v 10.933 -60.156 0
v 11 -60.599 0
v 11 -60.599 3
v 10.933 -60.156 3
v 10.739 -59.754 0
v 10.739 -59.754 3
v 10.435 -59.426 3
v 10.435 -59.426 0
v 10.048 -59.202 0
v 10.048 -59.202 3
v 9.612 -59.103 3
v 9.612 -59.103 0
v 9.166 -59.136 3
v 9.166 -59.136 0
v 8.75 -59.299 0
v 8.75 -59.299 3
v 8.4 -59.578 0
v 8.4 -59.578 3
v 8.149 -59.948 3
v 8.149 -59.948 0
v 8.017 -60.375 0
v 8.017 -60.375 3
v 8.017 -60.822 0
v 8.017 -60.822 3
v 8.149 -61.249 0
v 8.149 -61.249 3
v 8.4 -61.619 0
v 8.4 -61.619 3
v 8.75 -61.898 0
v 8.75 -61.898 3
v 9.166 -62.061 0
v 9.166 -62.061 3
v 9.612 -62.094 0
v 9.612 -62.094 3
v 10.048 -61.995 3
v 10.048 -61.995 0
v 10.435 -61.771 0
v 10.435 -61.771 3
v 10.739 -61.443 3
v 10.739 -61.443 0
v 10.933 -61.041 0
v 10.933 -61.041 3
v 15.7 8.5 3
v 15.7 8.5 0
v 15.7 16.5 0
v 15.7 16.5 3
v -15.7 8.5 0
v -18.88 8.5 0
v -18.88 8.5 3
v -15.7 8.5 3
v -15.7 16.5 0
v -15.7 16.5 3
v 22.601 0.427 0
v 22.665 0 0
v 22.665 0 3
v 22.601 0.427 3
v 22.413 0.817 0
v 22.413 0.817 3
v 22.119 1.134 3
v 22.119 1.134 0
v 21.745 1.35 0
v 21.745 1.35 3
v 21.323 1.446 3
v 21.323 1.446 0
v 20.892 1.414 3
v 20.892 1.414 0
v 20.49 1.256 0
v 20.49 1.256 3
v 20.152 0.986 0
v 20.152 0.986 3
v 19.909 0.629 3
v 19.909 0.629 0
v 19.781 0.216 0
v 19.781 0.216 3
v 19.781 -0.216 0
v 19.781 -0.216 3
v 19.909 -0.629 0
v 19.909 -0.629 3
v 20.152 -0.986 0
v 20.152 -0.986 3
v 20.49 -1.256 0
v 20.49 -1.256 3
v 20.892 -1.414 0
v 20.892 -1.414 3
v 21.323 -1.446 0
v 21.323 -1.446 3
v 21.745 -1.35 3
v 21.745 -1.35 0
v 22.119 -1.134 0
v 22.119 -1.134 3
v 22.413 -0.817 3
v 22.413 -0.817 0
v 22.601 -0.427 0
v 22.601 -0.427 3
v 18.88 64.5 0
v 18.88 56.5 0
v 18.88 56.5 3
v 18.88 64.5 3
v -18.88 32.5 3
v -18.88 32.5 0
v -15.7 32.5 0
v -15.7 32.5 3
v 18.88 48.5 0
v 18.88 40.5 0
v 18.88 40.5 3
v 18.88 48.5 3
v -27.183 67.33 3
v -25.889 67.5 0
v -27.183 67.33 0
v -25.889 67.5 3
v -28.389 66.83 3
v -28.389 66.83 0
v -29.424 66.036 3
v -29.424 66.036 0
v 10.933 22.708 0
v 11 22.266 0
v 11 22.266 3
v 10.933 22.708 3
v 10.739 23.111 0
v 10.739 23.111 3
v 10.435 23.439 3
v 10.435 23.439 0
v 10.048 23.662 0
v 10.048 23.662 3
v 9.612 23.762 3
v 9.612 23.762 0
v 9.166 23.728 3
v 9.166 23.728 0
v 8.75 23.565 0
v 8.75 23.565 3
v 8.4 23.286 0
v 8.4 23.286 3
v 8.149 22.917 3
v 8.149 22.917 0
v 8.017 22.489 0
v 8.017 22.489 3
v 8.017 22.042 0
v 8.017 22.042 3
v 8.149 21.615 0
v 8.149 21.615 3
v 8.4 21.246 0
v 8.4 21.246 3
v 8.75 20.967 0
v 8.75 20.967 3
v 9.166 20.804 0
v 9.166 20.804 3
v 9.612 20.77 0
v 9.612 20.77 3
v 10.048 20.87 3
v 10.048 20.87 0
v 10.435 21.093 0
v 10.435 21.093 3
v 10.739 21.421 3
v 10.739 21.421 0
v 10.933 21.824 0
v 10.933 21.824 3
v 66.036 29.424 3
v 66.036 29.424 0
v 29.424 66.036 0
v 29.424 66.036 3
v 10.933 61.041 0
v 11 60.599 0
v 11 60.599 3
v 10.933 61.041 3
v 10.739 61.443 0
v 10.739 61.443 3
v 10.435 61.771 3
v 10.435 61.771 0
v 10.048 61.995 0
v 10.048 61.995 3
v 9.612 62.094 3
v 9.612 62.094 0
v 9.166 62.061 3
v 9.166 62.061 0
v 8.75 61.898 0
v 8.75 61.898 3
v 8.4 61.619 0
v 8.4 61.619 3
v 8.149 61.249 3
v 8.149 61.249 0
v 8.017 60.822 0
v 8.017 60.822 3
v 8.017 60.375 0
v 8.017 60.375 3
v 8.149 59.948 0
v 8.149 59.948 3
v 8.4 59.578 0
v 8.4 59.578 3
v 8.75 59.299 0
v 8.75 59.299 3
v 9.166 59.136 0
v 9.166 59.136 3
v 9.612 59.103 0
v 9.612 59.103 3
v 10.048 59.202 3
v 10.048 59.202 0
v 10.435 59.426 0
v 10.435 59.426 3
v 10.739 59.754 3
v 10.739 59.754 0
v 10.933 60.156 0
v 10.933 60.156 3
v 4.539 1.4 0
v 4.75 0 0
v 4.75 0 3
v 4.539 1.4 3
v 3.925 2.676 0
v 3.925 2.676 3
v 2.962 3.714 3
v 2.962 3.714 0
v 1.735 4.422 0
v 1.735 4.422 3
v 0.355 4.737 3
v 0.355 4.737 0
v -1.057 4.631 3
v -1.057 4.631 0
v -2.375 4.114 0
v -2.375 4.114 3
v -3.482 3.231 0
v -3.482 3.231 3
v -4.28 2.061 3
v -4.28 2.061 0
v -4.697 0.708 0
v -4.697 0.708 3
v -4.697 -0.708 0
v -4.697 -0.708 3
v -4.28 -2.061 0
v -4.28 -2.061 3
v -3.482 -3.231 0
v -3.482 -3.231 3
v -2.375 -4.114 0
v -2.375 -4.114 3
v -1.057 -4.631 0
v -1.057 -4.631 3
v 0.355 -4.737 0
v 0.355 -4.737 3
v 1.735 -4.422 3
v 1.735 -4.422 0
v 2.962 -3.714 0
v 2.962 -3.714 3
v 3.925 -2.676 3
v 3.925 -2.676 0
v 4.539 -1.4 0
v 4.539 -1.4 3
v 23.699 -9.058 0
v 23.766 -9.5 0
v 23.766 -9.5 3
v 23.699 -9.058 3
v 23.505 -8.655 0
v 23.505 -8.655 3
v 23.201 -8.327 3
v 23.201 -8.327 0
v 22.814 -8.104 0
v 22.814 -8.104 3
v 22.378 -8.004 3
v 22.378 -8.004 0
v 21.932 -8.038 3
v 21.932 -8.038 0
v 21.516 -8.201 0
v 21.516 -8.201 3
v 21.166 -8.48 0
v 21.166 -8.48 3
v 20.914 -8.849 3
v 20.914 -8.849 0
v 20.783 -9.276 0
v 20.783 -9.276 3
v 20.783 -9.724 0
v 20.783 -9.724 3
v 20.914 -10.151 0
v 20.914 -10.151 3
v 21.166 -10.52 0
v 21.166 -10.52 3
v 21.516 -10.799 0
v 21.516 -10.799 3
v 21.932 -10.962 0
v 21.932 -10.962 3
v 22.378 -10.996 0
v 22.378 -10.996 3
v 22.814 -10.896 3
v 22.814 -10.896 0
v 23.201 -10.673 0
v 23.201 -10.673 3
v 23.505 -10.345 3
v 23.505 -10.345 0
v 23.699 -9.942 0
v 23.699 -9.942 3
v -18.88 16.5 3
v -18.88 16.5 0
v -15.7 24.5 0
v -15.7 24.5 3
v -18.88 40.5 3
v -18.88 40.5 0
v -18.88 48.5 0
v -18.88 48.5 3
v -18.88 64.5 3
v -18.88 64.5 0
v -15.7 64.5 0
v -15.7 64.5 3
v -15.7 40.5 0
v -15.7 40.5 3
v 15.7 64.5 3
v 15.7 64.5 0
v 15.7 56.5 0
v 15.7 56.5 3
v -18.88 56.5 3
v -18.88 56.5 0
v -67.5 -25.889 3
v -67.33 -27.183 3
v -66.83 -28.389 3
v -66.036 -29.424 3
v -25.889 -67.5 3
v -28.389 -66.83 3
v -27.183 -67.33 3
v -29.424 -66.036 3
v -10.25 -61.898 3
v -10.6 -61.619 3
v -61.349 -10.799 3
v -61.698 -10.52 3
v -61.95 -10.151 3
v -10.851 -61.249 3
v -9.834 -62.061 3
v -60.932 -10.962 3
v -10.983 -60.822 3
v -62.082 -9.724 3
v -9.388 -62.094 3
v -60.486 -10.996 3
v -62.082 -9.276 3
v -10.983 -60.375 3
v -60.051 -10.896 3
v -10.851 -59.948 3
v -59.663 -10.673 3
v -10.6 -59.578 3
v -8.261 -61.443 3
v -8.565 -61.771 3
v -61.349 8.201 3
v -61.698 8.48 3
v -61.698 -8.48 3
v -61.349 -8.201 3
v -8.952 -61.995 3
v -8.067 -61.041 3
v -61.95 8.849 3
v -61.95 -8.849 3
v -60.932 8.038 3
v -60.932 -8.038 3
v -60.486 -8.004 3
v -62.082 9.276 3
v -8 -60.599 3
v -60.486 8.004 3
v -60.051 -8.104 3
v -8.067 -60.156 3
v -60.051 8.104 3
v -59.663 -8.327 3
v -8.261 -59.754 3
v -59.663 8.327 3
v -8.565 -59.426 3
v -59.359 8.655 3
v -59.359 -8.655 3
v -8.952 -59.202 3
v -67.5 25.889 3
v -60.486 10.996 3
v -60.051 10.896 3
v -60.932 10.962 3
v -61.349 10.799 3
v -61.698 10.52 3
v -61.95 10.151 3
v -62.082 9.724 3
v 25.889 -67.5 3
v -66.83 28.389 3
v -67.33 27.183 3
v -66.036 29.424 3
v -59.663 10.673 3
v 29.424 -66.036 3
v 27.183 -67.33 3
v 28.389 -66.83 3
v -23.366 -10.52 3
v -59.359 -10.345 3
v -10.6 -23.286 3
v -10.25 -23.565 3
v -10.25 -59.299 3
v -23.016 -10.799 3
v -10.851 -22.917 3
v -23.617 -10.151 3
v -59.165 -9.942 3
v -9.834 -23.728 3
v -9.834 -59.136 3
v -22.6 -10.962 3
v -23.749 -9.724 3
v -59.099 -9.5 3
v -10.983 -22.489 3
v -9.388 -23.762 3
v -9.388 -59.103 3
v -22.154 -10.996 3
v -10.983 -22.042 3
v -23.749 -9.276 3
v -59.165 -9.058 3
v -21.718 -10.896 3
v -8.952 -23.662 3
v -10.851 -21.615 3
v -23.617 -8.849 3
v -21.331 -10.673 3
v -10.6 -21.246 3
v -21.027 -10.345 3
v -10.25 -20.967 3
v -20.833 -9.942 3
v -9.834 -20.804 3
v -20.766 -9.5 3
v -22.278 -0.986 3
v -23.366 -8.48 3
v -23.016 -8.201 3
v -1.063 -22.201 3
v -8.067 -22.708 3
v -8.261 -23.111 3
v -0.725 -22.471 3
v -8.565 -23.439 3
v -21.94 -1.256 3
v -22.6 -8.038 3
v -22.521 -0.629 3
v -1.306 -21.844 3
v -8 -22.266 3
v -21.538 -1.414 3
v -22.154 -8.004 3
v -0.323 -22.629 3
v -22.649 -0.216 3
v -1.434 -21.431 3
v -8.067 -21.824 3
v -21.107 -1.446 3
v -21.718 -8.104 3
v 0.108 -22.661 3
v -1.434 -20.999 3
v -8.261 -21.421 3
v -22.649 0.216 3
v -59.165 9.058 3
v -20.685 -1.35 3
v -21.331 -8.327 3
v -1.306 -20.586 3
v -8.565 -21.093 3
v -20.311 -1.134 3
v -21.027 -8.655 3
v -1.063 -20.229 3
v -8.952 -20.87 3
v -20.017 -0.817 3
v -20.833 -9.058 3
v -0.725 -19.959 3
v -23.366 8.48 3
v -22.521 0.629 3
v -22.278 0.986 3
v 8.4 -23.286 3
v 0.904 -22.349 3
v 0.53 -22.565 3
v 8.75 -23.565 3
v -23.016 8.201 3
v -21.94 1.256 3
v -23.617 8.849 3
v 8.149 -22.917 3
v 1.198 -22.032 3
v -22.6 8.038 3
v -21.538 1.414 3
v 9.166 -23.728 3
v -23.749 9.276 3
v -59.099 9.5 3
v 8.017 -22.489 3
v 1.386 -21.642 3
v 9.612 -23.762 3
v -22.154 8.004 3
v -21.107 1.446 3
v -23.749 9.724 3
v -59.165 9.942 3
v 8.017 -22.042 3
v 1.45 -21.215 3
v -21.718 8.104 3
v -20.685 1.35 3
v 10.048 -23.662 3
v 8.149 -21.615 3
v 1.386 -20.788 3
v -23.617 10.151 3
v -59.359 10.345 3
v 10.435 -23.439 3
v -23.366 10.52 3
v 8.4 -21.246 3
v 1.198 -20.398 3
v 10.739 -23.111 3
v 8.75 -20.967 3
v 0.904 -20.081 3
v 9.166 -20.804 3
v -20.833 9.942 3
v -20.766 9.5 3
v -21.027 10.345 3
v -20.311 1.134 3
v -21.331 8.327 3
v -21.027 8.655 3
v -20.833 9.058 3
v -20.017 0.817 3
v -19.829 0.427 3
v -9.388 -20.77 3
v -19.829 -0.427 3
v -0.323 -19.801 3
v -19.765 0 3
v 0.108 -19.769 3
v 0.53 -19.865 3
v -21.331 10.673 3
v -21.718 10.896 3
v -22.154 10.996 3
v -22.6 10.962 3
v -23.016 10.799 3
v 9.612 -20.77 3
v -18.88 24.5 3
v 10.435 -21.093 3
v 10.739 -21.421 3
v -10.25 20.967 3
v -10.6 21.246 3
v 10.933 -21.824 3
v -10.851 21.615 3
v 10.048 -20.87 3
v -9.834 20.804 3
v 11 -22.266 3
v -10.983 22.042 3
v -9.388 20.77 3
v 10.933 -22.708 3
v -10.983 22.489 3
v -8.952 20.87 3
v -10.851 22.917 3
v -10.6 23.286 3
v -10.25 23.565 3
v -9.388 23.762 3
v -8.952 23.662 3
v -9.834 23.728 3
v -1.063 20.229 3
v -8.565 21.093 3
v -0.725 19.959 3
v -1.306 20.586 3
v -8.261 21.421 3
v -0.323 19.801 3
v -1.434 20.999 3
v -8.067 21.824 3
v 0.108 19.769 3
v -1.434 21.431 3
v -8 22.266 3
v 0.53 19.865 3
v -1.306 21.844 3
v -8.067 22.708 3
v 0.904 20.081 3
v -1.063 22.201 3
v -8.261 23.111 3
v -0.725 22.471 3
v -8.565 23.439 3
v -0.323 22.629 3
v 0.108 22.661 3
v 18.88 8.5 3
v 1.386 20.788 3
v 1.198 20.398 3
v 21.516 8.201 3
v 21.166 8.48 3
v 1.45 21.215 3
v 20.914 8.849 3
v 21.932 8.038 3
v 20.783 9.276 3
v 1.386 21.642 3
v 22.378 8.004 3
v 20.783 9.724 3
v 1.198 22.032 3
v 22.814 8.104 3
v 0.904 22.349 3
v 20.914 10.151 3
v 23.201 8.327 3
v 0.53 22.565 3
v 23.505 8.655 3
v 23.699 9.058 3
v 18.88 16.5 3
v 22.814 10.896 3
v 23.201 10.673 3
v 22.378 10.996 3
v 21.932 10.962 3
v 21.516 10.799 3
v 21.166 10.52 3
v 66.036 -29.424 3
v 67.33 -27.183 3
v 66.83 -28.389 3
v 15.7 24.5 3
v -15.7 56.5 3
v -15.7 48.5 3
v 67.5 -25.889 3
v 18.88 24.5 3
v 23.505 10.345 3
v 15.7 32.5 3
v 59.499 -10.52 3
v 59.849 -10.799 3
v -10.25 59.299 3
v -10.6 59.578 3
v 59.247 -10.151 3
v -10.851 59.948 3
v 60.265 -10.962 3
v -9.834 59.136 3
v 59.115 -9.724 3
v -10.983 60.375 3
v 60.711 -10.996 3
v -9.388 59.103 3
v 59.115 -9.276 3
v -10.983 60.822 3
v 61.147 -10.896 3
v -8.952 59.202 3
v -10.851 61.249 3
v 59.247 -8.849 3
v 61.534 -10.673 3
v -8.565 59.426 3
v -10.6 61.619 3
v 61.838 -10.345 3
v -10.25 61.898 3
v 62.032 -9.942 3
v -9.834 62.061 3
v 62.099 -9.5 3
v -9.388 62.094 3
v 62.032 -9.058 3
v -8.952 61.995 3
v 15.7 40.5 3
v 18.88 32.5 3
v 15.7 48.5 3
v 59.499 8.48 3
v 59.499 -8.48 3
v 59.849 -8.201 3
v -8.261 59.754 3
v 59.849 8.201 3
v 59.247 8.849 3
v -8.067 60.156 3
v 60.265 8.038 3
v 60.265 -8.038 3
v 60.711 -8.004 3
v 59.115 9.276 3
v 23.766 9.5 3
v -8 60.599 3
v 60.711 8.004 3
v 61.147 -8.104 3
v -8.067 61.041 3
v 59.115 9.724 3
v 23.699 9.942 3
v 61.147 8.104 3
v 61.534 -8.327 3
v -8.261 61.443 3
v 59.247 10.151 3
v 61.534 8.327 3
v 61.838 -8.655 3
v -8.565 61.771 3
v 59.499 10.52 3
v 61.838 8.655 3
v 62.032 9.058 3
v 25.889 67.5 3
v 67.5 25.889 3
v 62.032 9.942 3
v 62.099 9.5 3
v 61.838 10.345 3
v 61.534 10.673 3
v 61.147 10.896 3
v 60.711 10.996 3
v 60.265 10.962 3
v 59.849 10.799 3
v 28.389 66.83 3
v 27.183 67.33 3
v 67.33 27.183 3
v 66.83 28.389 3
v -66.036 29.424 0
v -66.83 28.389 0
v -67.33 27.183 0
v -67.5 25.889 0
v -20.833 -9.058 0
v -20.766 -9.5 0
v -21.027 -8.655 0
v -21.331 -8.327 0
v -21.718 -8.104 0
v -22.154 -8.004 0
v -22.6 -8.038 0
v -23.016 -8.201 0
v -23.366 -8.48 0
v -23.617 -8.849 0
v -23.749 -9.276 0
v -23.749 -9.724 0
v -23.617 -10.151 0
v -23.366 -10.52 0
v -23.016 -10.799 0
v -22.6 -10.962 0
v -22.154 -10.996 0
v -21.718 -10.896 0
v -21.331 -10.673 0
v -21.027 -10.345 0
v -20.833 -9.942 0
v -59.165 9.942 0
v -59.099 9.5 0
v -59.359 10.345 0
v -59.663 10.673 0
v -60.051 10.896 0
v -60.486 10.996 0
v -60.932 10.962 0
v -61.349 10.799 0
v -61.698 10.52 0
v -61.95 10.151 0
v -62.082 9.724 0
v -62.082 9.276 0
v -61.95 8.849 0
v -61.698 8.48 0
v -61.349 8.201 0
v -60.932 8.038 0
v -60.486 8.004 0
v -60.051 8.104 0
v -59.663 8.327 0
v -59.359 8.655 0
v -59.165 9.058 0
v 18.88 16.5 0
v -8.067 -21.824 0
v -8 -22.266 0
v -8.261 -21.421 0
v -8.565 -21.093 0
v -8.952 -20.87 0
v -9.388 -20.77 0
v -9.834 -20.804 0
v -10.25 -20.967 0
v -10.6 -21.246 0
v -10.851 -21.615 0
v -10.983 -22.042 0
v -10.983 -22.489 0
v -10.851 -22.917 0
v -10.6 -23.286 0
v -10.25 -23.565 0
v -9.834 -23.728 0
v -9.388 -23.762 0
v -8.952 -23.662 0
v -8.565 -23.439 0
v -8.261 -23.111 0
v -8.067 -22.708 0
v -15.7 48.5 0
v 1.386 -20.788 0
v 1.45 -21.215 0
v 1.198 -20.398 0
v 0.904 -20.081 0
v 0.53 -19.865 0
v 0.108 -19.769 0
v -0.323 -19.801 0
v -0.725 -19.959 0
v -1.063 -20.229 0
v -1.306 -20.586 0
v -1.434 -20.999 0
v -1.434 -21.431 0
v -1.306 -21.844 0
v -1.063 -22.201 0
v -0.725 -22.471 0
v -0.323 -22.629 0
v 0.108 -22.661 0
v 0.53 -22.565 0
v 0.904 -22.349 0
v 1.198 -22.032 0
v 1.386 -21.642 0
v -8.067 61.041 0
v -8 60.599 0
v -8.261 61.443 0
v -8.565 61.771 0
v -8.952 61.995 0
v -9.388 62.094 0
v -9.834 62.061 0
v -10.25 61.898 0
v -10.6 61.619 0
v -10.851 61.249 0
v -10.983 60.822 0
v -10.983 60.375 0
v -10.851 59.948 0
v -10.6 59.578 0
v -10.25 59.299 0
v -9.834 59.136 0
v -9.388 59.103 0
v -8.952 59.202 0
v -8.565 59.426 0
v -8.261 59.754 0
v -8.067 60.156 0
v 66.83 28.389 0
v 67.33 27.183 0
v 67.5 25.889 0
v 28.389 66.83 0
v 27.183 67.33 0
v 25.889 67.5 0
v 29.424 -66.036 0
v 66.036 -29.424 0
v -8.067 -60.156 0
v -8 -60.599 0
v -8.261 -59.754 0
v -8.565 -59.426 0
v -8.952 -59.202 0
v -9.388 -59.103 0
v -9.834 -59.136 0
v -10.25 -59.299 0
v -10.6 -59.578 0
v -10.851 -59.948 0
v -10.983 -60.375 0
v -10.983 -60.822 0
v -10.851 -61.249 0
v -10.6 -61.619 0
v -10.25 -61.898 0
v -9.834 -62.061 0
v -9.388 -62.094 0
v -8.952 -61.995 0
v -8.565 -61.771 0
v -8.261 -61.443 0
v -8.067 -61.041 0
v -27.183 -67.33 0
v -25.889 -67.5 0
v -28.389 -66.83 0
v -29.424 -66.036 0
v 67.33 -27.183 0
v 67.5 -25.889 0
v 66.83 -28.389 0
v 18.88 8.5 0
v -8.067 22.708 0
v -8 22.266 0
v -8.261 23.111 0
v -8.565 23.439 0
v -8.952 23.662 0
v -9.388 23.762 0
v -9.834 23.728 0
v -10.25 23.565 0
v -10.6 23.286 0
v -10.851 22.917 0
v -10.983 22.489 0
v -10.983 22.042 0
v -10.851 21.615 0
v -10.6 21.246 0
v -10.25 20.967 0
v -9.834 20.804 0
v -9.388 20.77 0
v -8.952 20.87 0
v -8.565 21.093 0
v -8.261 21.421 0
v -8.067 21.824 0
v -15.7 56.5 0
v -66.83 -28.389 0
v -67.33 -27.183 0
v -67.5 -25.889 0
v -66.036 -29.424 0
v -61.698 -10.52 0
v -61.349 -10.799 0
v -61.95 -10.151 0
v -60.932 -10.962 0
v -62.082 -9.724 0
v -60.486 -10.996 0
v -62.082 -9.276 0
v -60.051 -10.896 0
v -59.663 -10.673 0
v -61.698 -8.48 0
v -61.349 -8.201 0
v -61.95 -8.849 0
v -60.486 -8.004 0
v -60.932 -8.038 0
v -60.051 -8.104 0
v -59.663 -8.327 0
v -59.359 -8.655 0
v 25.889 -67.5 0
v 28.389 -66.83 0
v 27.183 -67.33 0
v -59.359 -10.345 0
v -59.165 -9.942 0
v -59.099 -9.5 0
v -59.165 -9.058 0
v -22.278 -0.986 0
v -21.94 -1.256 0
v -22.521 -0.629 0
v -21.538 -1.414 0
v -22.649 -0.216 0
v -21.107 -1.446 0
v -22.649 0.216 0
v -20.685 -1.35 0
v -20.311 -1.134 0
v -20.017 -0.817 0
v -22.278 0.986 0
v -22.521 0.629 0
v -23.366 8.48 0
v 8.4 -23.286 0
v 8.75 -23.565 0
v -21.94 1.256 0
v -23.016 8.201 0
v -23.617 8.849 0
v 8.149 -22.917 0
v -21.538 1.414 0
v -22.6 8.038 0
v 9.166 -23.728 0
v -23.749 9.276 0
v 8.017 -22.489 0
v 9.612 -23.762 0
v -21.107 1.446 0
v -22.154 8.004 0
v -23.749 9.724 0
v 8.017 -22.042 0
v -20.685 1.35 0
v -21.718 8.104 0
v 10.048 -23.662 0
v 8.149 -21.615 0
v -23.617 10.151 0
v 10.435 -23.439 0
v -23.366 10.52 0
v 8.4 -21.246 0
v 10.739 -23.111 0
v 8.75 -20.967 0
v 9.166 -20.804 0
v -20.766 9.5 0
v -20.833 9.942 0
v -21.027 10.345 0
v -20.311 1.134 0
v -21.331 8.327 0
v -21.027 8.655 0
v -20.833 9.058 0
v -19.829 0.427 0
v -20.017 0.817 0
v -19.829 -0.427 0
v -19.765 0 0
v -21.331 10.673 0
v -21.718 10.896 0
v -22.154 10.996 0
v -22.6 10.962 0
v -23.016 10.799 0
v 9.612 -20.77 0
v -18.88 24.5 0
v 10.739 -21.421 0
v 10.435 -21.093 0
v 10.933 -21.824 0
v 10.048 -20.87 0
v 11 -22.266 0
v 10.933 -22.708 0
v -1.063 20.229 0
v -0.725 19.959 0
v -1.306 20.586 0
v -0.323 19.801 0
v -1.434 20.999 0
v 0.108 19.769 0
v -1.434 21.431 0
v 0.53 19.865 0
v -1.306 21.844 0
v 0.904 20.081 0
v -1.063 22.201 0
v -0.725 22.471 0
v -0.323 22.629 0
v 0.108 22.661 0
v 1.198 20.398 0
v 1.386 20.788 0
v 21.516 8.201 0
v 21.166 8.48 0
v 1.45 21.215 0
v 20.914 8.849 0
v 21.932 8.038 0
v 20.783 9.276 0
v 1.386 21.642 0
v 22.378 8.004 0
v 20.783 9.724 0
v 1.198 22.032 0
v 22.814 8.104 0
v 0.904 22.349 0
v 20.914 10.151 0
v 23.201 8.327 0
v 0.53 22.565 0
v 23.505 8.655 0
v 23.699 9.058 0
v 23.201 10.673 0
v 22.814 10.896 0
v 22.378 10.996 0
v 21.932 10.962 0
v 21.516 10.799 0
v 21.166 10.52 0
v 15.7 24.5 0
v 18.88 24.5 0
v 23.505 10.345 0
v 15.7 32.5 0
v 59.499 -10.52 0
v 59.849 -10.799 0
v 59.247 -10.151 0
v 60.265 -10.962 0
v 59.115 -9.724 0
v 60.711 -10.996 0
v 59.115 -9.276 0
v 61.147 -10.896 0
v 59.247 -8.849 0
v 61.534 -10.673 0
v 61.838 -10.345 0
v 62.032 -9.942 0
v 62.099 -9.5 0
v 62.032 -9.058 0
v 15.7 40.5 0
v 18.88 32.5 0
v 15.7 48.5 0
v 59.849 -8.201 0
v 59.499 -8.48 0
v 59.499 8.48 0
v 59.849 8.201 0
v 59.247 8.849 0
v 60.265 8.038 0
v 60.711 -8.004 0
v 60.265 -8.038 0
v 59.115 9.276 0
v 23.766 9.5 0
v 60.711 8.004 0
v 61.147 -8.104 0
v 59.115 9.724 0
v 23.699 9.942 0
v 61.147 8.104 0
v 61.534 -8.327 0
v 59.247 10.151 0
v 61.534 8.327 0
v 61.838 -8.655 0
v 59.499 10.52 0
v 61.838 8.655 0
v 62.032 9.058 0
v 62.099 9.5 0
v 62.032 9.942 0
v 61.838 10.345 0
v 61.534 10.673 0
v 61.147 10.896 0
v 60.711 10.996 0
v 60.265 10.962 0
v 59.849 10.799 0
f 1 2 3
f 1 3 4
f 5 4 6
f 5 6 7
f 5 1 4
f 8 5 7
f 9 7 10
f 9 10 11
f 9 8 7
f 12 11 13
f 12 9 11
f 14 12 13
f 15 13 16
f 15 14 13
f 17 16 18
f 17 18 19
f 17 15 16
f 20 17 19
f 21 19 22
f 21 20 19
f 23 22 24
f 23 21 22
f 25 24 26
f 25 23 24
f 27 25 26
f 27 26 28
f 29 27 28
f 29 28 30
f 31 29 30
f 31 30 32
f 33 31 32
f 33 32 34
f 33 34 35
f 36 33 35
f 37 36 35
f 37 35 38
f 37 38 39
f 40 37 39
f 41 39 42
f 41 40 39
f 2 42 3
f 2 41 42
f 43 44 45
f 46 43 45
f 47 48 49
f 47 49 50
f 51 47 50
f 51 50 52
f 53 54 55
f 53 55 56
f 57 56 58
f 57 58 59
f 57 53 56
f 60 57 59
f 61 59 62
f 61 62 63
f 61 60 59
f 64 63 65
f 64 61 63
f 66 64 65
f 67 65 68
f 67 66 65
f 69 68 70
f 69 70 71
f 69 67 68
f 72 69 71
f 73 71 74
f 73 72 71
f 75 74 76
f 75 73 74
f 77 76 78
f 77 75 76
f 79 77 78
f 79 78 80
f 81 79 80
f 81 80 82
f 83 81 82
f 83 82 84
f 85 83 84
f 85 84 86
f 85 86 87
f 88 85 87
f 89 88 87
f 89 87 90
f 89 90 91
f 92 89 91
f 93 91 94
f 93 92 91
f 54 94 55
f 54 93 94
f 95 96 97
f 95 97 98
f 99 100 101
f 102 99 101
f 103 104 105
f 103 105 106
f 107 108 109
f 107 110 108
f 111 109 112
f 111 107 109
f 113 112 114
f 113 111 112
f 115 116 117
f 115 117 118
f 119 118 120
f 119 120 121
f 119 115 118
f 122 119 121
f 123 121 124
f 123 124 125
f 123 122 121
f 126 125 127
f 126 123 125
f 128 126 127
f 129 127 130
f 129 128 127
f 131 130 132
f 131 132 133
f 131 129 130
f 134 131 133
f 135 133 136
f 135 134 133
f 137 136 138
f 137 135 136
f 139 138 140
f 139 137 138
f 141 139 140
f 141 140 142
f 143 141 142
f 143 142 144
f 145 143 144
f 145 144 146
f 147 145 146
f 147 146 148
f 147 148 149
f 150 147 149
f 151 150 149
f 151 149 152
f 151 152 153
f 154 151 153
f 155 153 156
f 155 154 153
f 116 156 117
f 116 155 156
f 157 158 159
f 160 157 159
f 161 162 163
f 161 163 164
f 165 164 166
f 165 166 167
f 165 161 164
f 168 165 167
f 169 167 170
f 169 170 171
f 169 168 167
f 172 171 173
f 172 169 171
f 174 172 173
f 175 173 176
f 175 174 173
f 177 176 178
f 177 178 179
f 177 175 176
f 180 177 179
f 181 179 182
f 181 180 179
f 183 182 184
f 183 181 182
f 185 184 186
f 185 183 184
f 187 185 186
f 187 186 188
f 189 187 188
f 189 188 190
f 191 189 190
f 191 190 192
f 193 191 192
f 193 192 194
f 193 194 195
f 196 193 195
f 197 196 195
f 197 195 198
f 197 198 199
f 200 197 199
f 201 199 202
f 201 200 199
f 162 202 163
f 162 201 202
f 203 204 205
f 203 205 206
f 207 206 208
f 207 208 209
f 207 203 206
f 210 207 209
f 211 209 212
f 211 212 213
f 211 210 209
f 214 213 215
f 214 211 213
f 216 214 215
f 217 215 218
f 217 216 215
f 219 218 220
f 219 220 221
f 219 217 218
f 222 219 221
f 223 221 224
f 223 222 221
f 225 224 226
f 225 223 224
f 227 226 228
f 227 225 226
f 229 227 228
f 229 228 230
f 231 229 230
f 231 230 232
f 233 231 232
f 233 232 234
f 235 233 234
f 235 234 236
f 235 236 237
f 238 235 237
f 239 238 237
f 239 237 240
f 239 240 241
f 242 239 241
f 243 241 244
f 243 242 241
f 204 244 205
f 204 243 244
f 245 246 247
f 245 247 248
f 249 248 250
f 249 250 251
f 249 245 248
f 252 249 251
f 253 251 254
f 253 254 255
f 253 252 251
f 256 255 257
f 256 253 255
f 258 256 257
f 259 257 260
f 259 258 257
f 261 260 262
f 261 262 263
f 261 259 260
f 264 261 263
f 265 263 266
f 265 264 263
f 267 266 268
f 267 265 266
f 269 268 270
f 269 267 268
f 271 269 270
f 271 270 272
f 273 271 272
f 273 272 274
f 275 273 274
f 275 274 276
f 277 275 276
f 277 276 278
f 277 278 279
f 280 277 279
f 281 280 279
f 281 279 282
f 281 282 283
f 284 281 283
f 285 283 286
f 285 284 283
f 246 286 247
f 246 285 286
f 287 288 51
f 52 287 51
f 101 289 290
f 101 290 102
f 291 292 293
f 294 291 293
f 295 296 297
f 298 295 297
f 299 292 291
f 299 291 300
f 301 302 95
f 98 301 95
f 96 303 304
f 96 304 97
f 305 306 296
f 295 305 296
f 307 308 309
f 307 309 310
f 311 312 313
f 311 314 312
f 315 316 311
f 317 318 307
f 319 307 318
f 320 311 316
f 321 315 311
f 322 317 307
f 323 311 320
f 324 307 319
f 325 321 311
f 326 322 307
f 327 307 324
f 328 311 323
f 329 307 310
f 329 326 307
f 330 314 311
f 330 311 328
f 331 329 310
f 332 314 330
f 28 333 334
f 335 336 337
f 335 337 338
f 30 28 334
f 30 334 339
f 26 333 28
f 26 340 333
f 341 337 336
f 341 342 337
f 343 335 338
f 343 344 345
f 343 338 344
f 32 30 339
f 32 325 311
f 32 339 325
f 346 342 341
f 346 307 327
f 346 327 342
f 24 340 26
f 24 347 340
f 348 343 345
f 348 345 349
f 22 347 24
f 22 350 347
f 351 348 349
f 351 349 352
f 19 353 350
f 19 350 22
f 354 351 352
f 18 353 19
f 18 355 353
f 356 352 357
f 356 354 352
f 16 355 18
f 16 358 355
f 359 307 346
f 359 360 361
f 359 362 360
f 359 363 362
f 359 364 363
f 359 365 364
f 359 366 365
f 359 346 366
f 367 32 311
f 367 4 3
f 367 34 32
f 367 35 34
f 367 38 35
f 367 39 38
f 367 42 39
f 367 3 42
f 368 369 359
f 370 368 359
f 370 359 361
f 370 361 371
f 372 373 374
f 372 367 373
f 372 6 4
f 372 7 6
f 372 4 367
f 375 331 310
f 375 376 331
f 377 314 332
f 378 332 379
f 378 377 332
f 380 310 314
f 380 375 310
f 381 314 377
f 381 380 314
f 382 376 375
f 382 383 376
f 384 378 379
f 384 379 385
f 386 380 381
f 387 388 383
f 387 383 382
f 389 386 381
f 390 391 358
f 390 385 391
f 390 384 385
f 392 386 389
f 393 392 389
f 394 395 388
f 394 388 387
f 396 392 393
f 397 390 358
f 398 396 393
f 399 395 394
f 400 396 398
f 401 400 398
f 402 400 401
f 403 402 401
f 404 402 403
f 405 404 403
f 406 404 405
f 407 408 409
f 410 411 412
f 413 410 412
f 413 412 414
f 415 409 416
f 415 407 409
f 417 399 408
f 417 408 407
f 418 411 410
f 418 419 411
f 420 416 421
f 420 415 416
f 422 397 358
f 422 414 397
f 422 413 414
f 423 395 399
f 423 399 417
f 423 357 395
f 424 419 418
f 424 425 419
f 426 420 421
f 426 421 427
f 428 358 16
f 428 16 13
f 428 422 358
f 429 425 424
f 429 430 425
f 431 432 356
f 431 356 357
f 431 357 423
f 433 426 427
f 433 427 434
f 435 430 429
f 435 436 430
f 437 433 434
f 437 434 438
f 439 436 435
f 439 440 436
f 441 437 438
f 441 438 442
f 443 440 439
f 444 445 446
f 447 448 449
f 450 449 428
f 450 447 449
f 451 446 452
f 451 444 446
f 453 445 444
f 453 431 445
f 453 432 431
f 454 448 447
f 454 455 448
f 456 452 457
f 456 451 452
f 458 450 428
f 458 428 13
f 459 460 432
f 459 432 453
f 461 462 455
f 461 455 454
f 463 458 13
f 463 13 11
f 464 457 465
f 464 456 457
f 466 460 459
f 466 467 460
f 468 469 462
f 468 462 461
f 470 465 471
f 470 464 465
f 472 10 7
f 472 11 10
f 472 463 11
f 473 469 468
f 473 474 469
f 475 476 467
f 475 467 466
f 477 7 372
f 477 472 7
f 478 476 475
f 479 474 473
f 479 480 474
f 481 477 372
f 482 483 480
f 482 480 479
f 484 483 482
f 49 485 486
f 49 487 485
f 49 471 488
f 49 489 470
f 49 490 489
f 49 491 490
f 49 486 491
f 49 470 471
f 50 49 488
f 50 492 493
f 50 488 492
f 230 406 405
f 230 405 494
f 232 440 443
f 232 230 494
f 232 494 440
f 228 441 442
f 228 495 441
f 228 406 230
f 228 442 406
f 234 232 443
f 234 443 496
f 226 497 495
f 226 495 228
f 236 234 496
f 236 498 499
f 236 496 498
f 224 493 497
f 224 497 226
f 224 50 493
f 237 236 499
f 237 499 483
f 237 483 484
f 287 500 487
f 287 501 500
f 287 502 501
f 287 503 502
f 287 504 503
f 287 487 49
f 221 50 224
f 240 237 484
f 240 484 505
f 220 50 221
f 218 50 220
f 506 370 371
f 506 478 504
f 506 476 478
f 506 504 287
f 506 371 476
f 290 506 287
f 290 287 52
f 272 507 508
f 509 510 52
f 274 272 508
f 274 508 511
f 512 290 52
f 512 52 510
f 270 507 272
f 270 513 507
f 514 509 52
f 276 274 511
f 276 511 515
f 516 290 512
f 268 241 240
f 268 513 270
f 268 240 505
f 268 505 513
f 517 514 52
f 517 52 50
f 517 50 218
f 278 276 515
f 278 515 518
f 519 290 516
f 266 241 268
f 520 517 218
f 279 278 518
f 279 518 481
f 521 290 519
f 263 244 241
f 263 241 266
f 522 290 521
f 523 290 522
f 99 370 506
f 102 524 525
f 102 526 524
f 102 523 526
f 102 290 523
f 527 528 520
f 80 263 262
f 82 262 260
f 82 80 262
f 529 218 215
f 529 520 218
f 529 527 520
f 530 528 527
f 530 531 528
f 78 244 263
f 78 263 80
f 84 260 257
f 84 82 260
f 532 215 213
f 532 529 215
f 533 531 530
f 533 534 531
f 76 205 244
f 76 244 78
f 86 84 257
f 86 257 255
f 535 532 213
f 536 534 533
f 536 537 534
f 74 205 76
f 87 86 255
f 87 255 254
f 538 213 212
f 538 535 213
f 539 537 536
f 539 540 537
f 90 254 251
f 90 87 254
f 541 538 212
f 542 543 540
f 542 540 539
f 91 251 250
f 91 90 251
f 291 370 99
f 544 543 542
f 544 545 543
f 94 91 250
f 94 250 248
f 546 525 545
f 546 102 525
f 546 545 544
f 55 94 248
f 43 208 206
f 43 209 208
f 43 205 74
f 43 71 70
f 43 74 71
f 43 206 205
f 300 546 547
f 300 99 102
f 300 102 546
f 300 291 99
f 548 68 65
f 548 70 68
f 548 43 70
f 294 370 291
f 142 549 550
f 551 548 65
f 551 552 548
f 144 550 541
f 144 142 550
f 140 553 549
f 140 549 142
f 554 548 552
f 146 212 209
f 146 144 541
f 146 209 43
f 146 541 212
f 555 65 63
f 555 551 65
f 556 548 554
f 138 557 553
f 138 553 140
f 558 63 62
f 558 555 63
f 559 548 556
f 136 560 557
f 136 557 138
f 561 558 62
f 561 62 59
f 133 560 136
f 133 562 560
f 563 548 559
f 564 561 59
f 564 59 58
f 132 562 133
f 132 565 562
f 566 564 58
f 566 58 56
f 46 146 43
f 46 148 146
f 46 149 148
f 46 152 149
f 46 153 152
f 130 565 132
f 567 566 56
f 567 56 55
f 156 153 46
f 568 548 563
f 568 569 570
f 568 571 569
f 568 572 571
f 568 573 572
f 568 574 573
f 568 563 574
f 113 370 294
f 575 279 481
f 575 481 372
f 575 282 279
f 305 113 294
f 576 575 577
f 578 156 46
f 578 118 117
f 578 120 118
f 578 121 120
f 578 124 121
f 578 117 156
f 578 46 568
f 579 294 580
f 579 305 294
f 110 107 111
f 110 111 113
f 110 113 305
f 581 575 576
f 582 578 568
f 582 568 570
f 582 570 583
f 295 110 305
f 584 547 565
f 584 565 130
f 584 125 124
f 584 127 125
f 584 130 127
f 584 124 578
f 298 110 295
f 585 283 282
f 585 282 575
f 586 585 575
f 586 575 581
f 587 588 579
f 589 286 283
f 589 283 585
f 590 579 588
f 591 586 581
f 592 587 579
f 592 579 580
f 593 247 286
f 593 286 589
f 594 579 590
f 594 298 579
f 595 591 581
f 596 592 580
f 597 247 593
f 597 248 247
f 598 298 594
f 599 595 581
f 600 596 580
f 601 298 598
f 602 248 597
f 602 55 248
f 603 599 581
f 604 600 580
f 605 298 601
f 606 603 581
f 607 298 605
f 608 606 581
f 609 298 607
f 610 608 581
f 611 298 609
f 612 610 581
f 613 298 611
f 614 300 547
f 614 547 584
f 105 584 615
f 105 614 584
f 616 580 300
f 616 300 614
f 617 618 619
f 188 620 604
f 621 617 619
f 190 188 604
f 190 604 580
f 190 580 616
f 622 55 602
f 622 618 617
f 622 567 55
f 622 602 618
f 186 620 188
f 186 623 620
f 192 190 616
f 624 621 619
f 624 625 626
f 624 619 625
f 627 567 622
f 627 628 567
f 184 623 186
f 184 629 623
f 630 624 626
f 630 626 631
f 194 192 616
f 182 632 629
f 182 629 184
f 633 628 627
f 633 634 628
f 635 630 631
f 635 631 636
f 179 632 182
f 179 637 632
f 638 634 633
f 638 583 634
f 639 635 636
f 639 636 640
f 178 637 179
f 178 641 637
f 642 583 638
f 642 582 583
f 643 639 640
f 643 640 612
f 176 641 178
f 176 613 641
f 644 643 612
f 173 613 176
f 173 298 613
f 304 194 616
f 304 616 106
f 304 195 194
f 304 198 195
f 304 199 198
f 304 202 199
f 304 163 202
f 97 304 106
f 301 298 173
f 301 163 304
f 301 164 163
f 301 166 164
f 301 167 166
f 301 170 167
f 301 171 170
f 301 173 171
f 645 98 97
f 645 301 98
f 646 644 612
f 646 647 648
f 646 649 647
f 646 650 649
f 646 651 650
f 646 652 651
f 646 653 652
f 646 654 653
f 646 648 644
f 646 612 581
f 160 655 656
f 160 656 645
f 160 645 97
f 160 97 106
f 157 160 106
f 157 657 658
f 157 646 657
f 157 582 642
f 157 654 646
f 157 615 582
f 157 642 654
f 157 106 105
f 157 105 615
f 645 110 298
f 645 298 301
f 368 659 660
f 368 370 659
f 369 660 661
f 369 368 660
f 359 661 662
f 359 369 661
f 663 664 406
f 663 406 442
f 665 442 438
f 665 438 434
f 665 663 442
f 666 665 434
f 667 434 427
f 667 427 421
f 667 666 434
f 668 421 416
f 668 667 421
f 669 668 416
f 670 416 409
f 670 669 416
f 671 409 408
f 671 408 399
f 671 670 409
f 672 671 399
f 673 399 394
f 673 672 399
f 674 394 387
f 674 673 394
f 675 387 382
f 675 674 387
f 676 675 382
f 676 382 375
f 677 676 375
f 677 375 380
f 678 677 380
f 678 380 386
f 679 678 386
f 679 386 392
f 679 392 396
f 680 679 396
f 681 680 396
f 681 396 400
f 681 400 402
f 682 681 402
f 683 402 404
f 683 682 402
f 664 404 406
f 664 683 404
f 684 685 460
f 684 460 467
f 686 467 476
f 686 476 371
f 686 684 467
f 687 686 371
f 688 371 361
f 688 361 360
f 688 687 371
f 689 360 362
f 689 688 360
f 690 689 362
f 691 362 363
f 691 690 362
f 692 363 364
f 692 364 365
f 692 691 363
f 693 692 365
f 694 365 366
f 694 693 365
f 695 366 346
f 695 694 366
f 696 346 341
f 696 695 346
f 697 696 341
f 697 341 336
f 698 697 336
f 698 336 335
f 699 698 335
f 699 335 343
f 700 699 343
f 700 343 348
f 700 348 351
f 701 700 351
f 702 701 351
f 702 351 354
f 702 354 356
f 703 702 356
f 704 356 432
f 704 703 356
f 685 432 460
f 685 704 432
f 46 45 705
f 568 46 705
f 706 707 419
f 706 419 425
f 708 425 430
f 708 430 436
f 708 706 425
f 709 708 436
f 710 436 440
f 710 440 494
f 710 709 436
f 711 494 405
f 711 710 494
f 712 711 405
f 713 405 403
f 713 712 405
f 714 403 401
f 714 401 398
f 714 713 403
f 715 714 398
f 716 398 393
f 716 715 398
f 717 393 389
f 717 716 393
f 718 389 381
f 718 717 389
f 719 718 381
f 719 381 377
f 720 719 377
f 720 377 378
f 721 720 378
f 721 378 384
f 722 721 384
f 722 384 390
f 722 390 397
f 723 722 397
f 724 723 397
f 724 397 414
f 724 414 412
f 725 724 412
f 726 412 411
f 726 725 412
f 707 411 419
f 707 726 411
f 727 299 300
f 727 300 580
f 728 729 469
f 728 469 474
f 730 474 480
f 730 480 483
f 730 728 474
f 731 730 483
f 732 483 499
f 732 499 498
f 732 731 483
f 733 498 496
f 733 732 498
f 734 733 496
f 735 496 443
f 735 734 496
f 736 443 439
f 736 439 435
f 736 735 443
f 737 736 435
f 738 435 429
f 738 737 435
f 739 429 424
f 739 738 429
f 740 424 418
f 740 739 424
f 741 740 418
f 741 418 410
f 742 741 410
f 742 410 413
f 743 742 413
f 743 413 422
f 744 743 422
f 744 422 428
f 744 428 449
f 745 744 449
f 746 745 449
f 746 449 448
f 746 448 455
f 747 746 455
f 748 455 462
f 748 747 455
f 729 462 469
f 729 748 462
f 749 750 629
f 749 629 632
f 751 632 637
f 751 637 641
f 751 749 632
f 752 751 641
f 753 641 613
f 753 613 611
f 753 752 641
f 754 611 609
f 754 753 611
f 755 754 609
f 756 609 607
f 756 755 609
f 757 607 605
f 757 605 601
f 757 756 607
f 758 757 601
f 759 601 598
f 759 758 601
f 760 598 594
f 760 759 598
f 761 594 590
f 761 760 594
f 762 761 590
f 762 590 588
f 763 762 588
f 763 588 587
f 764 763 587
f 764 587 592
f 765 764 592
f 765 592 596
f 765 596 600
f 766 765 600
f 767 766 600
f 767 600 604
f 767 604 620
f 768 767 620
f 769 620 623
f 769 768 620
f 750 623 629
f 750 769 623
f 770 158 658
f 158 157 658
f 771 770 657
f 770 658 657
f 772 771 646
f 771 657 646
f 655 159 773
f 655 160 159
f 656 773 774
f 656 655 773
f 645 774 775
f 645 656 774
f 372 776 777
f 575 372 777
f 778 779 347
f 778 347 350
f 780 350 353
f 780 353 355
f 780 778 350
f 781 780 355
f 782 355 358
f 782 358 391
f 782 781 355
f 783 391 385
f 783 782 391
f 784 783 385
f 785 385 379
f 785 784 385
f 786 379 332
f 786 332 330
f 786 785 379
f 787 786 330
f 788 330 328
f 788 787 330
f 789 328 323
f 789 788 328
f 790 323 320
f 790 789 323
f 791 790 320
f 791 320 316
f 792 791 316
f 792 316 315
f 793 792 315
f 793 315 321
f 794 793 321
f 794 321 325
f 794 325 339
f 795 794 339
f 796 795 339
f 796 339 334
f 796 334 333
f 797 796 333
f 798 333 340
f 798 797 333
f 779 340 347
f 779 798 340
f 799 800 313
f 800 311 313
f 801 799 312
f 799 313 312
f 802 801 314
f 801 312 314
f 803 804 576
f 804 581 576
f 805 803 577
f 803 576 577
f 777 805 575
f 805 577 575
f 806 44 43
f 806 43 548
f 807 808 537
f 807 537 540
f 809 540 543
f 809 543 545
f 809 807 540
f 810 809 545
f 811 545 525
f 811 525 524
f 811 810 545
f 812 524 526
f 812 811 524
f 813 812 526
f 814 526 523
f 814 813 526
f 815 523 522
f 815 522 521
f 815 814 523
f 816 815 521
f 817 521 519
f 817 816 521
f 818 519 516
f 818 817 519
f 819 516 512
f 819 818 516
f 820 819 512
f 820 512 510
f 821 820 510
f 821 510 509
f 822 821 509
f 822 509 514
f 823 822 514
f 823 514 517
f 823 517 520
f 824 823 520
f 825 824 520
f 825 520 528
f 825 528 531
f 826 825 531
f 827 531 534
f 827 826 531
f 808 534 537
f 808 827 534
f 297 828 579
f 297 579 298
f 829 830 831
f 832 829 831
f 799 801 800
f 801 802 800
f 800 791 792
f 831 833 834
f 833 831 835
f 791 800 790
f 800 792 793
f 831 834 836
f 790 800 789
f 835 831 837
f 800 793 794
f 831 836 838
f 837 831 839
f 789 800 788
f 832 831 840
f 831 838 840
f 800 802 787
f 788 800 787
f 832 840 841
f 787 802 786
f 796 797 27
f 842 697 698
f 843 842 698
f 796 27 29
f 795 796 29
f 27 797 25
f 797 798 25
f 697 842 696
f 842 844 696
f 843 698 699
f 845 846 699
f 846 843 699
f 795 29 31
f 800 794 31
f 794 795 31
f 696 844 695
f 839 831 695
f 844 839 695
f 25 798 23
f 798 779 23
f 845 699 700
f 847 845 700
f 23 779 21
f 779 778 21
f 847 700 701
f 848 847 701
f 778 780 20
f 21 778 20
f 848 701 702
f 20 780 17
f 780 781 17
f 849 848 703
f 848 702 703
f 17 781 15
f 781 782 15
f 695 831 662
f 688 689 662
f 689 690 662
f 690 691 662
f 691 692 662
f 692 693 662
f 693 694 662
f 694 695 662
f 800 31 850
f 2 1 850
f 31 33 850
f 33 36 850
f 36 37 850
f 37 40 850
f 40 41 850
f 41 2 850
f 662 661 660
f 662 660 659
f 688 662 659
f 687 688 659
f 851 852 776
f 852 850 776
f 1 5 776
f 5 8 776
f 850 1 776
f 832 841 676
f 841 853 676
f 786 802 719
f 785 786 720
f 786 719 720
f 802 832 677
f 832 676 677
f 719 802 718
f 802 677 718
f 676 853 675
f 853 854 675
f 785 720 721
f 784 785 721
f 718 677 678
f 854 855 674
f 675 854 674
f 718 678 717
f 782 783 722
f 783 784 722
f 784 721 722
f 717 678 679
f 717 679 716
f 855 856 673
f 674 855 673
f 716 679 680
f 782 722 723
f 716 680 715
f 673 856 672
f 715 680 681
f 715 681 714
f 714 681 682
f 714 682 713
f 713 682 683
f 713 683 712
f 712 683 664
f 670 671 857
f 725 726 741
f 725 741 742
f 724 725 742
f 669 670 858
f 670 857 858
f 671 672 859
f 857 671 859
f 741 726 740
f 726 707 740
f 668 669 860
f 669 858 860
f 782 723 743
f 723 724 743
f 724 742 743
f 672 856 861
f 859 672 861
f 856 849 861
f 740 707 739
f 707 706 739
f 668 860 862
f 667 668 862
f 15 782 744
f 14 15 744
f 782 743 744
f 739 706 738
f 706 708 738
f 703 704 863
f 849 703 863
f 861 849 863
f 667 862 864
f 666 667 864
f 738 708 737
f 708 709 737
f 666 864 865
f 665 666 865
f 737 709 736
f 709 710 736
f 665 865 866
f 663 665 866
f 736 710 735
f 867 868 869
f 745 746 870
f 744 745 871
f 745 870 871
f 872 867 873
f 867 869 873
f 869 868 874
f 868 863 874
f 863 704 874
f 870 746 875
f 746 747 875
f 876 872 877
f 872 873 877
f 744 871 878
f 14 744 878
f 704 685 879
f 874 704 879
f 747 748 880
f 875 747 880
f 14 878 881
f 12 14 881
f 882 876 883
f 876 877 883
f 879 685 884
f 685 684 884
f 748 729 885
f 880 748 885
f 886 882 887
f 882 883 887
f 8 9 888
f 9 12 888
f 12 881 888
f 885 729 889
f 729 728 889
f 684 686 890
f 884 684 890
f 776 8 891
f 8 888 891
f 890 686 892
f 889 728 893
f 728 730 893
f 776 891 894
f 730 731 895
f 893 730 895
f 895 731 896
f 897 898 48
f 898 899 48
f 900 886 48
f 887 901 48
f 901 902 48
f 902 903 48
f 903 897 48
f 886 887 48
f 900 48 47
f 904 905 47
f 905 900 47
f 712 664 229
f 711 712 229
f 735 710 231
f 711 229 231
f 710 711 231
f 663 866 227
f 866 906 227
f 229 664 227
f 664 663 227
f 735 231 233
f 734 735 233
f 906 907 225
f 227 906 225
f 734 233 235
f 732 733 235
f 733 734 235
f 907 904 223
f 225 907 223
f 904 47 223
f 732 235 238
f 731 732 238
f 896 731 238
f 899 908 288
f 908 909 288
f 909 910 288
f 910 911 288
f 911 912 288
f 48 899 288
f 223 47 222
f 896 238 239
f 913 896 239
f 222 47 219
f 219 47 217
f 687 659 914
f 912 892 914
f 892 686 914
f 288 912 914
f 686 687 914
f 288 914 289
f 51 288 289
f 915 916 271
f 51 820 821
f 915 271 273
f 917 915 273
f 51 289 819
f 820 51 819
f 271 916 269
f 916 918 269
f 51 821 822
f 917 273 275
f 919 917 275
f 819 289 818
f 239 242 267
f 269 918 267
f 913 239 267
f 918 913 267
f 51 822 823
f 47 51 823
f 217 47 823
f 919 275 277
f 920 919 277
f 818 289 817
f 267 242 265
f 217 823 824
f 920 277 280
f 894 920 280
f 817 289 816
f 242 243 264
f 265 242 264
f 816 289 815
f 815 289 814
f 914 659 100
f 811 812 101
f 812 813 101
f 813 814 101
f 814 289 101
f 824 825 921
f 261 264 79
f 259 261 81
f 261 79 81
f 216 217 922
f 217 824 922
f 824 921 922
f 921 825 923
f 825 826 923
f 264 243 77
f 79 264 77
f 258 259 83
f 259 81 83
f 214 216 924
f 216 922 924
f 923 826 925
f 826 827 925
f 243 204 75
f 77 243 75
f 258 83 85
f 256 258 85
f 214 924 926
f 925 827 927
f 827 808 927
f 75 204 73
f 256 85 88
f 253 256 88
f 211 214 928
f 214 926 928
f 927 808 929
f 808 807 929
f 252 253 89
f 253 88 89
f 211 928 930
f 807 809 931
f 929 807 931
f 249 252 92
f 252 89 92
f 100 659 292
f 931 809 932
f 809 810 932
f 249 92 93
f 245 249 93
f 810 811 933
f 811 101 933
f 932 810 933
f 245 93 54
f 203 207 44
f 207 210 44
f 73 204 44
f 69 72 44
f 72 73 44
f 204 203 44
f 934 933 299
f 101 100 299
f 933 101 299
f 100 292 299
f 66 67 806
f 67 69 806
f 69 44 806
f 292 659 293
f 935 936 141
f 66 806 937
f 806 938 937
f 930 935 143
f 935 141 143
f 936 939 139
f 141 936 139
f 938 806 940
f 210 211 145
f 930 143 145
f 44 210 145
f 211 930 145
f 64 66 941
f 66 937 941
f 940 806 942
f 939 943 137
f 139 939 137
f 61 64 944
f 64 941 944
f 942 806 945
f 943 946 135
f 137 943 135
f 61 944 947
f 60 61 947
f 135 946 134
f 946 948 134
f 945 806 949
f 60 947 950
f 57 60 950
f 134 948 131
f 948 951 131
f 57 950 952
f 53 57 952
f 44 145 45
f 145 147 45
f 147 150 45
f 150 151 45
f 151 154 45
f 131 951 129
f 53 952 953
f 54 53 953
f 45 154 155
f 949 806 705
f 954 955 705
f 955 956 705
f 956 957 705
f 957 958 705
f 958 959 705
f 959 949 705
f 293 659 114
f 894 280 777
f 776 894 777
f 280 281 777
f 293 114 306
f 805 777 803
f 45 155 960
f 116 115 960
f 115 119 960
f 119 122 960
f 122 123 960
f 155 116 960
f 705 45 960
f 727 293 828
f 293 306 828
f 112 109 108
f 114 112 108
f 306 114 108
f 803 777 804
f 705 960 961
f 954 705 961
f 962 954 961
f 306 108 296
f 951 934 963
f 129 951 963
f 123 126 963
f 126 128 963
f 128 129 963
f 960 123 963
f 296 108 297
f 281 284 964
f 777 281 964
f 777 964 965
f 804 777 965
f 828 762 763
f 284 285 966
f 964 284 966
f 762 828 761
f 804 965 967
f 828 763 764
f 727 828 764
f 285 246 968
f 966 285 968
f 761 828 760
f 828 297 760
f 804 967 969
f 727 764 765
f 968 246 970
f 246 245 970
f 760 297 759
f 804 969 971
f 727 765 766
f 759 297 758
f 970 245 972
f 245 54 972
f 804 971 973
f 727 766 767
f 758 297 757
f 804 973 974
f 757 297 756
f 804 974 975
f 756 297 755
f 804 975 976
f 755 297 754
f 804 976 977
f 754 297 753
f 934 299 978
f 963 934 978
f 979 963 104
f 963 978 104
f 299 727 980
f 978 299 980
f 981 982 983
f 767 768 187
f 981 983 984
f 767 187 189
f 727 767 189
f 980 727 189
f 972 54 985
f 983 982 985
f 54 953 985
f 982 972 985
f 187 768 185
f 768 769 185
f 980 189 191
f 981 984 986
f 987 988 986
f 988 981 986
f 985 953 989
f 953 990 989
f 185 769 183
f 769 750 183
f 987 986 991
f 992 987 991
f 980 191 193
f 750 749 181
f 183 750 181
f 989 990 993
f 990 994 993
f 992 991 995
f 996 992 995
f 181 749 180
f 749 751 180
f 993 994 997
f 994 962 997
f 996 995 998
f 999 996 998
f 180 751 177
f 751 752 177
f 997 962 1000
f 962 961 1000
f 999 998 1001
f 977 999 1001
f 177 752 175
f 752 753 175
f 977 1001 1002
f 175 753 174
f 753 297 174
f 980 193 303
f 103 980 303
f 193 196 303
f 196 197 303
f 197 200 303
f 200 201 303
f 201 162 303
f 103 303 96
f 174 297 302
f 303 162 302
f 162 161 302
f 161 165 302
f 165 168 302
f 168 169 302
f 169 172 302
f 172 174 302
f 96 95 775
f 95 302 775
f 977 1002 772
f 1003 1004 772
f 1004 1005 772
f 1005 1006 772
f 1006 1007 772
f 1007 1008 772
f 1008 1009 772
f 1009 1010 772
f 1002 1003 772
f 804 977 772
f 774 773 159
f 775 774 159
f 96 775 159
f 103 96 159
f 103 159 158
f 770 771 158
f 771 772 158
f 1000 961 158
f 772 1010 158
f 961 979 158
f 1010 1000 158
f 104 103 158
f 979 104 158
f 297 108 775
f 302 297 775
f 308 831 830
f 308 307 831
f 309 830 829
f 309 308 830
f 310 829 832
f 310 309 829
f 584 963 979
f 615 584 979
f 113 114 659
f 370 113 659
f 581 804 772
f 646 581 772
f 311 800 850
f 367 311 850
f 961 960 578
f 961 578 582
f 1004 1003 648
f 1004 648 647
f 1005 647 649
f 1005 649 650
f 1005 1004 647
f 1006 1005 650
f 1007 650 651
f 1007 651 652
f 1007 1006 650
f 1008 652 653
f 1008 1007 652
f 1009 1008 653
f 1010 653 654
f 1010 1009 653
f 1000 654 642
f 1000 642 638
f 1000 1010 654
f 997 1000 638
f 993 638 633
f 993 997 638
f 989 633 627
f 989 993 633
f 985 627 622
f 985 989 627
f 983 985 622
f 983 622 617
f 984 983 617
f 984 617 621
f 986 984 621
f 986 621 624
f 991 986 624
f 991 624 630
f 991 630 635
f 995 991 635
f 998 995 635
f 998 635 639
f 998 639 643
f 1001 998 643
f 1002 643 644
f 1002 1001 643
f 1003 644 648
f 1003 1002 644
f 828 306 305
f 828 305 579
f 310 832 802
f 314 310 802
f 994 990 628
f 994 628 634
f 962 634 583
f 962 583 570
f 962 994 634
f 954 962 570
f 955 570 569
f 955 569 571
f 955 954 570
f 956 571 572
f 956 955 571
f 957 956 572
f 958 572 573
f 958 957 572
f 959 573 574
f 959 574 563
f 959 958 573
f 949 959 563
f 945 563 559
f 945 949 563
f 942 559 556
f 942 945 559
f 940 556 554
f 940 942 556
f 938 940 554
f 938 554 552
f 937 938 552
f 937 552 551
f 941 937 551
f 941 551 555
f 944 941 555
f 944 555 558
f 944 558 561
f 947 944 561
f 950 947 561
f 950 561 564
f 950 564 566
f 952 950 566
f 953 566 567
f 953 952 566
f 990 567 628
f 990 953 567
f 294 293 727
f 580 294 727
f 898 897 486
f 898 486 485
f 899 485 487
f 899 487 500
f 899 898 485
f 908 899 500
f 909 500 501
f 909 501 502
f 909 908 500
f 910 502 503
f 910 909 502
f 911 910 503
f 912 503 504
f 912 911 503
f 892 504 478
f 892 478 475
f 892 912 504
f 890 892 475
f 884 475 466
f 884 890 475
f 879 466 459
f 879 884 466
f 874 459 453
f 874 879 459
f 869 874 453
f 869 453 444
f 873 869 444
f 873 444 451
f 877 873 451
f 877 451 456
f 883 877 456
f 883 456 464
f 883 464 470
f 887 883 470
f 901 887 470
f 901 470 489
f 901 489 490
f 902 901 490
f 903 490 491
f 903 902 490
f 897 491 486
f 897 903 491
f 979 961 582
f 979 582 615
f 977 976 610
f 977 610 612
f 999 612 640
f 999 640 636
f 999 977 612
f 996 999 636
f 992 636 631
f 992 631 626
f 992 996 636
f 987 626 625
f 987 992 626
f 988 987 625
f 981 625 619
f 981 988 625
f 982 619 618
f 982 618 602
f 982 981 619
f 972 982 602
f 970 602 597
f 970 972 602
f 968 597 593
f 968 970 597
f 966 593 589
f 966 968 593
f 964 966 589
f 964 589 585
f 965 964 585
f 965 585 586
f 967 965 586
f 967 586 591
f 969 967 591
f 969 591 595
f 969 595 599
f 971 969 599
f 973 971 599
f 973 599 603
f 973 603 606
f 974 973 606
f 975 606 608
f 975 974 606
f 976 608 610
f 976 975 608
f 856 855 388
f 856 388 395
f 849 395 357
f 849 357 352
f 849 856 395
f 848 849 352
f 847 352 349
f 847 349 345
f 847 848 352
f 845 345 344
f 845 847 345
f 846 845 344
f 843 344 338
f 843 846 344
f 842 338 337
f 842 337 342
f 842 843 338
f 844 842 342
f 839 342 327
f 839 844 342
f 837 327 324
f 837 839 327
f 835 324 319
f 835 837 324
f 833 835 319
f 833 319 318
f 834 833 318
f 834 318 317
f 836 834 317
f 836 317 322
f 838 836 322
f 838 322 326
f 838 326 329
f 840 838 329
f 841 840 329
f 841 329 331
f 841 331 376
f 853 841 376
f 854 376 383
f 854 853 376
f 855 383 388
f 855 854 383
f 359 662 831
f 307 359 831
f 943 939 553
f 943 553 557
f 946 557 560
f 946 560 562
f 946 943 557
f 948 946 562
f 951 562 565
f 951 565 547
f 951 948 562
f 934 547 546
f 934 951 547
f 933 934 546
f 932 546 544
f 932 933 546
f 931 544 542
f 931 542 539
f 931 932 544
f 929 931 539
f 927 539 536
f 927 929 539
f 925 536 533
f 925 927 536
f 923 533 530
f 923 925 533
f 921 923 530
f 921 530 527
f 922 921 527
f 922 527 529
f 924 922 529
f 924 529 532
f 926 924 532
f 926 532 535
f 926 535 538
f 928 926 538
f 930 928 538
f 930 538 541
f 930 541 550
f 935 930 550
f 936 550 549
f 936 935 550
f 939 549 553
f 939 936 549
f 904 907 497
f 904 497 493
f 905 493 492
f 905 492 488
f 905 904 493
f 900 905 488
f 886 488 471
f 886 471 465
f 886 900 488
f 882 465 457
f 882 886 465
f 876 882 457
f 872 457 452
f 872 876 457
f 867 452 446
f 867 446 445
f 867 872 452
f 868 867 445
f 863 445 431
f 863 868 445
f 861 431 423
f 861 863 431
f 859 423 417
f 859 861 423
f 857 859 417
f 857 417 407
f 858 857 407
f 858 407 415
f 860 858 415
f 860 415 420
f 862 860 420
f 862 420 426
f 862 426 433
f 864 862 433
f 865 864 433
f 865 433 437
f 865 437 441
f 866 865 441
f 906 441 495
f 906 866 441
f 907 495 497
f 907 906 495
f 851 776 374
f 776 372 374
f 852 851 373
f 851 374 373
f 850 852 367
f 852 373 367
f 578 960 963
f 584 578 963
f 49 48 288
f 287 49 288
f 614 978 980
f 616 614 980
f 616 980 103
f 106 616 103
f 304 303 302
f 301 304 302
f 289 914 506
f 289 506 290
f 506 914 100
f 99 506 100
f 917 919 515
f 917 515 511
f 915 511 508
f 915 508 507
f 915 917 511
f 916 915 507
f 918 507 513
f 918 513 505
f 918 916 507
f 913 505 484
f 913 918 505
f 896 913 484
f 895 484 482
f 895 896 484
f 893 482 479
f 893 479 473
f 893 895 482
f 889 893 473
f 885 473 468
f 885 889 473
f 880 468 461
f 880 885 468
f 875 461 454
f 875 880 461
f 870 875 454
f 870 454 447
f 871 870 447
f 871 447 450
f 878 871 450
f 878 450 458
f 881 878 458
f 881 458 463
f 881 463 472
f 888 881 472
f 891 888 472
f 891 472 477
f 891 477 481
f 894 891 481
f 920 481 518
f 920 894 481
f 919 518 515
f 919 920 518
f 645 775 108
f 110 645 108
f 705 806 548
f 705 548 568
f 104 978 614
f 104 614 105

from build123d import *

# Parameters (mm, degrees)
F0_R     = 1.5
F0_R_2   = 1.45
F0_W     = 3.18
F0_H     = 8
F0_R_3   = 4.75
F1_DEPTH = 3
F2_R     = 5


with BuildPart() as f1:
    # F0 (on Top) → F1 (new body)
    with BuildSketch(Plane.XY):
        Polygon((67.5, 27.96), (27.96, 67.5), (-27.96, 67.5), (-67.5, 27.96), (-67.5, -27.96), (-27.96, -67.5), (27.96, -67.5), (67.5, -27.96), align=None)
        with Locations((-9.5, -60.598515)):
            Circle(F0_R, mode=Mode.SUBTRACT)
        with Locations((-60.598515, -9.5)):
            Circle(F0_R, mode=Mode.SUBTRACT)
        with Locations((-9.5, -22.265932)):
            Circle(F0_R, mode=Mode.SUBTRACT)
        with Locations((-22.265932, -9.5)):
            Circle(F0_R, mode=Mode.SUBTRACT)
        with Locations((9.5, -60.598515)):
            Circle(F0_R, mode=Mode.SUBTRACT)
        with Locations((0, -21.215)):
            Circle(F0_R_2, mode=Mode.SUBTRACT)
        with Locations((9.5, -22.265932)):
            Circle(F0_R, mode=Mode.SUBTRACT)
        with Locations((22.265932, -9.5)):
            Circle(F0_R, mode=Mode.SUBTRACT)
        with Locations((60.598515, -9.5)):
            Circle(F0_R, mode=Mode.SUBTRACT)
        with Locations((-60.598515, 9.5)):
            Circle(F0_R, mode=Mode.SUBTRACT)
        with Locations((-21.215, 0)):
            Circle(F0_R_2, mode=Mode.SUBTRACT)
        with Locations((-22.265932, 9.5)):
            Circle(F0_R, mode=Mode.SUBTRACT)
        with Locations((-17.29, 12.5)):
            Rectangle(F0_W, F0_H, mode=Mode.SUBTRACT)
        with Locations((-17.29, 28.5)):
            Rectangle(F0_W, F0_H, mode=Mode.SUBTRACT)
        with Locations((-9.5, 22.265932)):
            Circle(F0_R, mode=Mode.SUBTRACT)
        with Locations((-17.29, 44.5)):
            Rectangle(F0_W, F0_H, mode=Mode.SUBTRACT)
        with Locations((-17.29, 60.5)):
            Rectangle(F0_W, F0_H, mode=Mode.SUBTRACT)
        with Locations((-9.5, 60.598515)):
            Circle(F0_R, mode=Mode.SUBTRACT)
        Circle(F0_R_3, mode=Mode.SUBTRACT)
        with Locations((21.215, 0)):
            Circle(F0_R_2, mode=Mode.SUBTRACT)
        with Locations((17.29, 12.5)):
            Rectangle(F0_W, F0_H, mode=Mode.SUBTRACT)
        with Locations((22.265932, 9.5)):
            Circle(F0_R, mode=Mode.SUBTRACT)
        with Locations((0, 21.215)):
            Circle(F0_R_2, mode=Mode.SUBTRACT)
        with Locations((9.5, 22.265932)):
            Circle(F0_R, mode=Mode.SUBTRACT)
        with Locations((17.29, 28.5)):
            Rectangle(F0_W, F0_H, mode=Mode.SUBTRACT)
        with Locations((60.598515, 9.5)):
            Circle(F0_R, mode=Mode.SUBTRACT)
        with Locations((17.29, 44.5)):
            Rectangle(F0_W, F0_H, mode=Mode.SUBTRACT)
        with Locations((9.5, 60.598515)):
            Circle(F0_R, mode=Mode.SUBTRACT)
        with Locations((17.29, 60.5)):
            Rectangle(F0_W, F0_H, mode=Mode.SUBTRACT)
    extrude(amount=F1_DEPTH)

    # F2
    f2_edges = [f1.edges().sort_by_distance(p)[0] for p in [
        (-27.96, 67.5, 1.5),
        (-67.5, 27.96, 1.5),
        (-67.5, -27.96, 1.5),
        (-27.96, -67.5, 1.5),
        (27.96, -67.5, 1.5),
        (67.5, -27.96, 1.5),
        (67.5, 27.96, 1.5),
        (27.96, 67.5, 1.5),
    ]]
    fillet(f2_edges, radius=F2_R)


solid = f1.part
